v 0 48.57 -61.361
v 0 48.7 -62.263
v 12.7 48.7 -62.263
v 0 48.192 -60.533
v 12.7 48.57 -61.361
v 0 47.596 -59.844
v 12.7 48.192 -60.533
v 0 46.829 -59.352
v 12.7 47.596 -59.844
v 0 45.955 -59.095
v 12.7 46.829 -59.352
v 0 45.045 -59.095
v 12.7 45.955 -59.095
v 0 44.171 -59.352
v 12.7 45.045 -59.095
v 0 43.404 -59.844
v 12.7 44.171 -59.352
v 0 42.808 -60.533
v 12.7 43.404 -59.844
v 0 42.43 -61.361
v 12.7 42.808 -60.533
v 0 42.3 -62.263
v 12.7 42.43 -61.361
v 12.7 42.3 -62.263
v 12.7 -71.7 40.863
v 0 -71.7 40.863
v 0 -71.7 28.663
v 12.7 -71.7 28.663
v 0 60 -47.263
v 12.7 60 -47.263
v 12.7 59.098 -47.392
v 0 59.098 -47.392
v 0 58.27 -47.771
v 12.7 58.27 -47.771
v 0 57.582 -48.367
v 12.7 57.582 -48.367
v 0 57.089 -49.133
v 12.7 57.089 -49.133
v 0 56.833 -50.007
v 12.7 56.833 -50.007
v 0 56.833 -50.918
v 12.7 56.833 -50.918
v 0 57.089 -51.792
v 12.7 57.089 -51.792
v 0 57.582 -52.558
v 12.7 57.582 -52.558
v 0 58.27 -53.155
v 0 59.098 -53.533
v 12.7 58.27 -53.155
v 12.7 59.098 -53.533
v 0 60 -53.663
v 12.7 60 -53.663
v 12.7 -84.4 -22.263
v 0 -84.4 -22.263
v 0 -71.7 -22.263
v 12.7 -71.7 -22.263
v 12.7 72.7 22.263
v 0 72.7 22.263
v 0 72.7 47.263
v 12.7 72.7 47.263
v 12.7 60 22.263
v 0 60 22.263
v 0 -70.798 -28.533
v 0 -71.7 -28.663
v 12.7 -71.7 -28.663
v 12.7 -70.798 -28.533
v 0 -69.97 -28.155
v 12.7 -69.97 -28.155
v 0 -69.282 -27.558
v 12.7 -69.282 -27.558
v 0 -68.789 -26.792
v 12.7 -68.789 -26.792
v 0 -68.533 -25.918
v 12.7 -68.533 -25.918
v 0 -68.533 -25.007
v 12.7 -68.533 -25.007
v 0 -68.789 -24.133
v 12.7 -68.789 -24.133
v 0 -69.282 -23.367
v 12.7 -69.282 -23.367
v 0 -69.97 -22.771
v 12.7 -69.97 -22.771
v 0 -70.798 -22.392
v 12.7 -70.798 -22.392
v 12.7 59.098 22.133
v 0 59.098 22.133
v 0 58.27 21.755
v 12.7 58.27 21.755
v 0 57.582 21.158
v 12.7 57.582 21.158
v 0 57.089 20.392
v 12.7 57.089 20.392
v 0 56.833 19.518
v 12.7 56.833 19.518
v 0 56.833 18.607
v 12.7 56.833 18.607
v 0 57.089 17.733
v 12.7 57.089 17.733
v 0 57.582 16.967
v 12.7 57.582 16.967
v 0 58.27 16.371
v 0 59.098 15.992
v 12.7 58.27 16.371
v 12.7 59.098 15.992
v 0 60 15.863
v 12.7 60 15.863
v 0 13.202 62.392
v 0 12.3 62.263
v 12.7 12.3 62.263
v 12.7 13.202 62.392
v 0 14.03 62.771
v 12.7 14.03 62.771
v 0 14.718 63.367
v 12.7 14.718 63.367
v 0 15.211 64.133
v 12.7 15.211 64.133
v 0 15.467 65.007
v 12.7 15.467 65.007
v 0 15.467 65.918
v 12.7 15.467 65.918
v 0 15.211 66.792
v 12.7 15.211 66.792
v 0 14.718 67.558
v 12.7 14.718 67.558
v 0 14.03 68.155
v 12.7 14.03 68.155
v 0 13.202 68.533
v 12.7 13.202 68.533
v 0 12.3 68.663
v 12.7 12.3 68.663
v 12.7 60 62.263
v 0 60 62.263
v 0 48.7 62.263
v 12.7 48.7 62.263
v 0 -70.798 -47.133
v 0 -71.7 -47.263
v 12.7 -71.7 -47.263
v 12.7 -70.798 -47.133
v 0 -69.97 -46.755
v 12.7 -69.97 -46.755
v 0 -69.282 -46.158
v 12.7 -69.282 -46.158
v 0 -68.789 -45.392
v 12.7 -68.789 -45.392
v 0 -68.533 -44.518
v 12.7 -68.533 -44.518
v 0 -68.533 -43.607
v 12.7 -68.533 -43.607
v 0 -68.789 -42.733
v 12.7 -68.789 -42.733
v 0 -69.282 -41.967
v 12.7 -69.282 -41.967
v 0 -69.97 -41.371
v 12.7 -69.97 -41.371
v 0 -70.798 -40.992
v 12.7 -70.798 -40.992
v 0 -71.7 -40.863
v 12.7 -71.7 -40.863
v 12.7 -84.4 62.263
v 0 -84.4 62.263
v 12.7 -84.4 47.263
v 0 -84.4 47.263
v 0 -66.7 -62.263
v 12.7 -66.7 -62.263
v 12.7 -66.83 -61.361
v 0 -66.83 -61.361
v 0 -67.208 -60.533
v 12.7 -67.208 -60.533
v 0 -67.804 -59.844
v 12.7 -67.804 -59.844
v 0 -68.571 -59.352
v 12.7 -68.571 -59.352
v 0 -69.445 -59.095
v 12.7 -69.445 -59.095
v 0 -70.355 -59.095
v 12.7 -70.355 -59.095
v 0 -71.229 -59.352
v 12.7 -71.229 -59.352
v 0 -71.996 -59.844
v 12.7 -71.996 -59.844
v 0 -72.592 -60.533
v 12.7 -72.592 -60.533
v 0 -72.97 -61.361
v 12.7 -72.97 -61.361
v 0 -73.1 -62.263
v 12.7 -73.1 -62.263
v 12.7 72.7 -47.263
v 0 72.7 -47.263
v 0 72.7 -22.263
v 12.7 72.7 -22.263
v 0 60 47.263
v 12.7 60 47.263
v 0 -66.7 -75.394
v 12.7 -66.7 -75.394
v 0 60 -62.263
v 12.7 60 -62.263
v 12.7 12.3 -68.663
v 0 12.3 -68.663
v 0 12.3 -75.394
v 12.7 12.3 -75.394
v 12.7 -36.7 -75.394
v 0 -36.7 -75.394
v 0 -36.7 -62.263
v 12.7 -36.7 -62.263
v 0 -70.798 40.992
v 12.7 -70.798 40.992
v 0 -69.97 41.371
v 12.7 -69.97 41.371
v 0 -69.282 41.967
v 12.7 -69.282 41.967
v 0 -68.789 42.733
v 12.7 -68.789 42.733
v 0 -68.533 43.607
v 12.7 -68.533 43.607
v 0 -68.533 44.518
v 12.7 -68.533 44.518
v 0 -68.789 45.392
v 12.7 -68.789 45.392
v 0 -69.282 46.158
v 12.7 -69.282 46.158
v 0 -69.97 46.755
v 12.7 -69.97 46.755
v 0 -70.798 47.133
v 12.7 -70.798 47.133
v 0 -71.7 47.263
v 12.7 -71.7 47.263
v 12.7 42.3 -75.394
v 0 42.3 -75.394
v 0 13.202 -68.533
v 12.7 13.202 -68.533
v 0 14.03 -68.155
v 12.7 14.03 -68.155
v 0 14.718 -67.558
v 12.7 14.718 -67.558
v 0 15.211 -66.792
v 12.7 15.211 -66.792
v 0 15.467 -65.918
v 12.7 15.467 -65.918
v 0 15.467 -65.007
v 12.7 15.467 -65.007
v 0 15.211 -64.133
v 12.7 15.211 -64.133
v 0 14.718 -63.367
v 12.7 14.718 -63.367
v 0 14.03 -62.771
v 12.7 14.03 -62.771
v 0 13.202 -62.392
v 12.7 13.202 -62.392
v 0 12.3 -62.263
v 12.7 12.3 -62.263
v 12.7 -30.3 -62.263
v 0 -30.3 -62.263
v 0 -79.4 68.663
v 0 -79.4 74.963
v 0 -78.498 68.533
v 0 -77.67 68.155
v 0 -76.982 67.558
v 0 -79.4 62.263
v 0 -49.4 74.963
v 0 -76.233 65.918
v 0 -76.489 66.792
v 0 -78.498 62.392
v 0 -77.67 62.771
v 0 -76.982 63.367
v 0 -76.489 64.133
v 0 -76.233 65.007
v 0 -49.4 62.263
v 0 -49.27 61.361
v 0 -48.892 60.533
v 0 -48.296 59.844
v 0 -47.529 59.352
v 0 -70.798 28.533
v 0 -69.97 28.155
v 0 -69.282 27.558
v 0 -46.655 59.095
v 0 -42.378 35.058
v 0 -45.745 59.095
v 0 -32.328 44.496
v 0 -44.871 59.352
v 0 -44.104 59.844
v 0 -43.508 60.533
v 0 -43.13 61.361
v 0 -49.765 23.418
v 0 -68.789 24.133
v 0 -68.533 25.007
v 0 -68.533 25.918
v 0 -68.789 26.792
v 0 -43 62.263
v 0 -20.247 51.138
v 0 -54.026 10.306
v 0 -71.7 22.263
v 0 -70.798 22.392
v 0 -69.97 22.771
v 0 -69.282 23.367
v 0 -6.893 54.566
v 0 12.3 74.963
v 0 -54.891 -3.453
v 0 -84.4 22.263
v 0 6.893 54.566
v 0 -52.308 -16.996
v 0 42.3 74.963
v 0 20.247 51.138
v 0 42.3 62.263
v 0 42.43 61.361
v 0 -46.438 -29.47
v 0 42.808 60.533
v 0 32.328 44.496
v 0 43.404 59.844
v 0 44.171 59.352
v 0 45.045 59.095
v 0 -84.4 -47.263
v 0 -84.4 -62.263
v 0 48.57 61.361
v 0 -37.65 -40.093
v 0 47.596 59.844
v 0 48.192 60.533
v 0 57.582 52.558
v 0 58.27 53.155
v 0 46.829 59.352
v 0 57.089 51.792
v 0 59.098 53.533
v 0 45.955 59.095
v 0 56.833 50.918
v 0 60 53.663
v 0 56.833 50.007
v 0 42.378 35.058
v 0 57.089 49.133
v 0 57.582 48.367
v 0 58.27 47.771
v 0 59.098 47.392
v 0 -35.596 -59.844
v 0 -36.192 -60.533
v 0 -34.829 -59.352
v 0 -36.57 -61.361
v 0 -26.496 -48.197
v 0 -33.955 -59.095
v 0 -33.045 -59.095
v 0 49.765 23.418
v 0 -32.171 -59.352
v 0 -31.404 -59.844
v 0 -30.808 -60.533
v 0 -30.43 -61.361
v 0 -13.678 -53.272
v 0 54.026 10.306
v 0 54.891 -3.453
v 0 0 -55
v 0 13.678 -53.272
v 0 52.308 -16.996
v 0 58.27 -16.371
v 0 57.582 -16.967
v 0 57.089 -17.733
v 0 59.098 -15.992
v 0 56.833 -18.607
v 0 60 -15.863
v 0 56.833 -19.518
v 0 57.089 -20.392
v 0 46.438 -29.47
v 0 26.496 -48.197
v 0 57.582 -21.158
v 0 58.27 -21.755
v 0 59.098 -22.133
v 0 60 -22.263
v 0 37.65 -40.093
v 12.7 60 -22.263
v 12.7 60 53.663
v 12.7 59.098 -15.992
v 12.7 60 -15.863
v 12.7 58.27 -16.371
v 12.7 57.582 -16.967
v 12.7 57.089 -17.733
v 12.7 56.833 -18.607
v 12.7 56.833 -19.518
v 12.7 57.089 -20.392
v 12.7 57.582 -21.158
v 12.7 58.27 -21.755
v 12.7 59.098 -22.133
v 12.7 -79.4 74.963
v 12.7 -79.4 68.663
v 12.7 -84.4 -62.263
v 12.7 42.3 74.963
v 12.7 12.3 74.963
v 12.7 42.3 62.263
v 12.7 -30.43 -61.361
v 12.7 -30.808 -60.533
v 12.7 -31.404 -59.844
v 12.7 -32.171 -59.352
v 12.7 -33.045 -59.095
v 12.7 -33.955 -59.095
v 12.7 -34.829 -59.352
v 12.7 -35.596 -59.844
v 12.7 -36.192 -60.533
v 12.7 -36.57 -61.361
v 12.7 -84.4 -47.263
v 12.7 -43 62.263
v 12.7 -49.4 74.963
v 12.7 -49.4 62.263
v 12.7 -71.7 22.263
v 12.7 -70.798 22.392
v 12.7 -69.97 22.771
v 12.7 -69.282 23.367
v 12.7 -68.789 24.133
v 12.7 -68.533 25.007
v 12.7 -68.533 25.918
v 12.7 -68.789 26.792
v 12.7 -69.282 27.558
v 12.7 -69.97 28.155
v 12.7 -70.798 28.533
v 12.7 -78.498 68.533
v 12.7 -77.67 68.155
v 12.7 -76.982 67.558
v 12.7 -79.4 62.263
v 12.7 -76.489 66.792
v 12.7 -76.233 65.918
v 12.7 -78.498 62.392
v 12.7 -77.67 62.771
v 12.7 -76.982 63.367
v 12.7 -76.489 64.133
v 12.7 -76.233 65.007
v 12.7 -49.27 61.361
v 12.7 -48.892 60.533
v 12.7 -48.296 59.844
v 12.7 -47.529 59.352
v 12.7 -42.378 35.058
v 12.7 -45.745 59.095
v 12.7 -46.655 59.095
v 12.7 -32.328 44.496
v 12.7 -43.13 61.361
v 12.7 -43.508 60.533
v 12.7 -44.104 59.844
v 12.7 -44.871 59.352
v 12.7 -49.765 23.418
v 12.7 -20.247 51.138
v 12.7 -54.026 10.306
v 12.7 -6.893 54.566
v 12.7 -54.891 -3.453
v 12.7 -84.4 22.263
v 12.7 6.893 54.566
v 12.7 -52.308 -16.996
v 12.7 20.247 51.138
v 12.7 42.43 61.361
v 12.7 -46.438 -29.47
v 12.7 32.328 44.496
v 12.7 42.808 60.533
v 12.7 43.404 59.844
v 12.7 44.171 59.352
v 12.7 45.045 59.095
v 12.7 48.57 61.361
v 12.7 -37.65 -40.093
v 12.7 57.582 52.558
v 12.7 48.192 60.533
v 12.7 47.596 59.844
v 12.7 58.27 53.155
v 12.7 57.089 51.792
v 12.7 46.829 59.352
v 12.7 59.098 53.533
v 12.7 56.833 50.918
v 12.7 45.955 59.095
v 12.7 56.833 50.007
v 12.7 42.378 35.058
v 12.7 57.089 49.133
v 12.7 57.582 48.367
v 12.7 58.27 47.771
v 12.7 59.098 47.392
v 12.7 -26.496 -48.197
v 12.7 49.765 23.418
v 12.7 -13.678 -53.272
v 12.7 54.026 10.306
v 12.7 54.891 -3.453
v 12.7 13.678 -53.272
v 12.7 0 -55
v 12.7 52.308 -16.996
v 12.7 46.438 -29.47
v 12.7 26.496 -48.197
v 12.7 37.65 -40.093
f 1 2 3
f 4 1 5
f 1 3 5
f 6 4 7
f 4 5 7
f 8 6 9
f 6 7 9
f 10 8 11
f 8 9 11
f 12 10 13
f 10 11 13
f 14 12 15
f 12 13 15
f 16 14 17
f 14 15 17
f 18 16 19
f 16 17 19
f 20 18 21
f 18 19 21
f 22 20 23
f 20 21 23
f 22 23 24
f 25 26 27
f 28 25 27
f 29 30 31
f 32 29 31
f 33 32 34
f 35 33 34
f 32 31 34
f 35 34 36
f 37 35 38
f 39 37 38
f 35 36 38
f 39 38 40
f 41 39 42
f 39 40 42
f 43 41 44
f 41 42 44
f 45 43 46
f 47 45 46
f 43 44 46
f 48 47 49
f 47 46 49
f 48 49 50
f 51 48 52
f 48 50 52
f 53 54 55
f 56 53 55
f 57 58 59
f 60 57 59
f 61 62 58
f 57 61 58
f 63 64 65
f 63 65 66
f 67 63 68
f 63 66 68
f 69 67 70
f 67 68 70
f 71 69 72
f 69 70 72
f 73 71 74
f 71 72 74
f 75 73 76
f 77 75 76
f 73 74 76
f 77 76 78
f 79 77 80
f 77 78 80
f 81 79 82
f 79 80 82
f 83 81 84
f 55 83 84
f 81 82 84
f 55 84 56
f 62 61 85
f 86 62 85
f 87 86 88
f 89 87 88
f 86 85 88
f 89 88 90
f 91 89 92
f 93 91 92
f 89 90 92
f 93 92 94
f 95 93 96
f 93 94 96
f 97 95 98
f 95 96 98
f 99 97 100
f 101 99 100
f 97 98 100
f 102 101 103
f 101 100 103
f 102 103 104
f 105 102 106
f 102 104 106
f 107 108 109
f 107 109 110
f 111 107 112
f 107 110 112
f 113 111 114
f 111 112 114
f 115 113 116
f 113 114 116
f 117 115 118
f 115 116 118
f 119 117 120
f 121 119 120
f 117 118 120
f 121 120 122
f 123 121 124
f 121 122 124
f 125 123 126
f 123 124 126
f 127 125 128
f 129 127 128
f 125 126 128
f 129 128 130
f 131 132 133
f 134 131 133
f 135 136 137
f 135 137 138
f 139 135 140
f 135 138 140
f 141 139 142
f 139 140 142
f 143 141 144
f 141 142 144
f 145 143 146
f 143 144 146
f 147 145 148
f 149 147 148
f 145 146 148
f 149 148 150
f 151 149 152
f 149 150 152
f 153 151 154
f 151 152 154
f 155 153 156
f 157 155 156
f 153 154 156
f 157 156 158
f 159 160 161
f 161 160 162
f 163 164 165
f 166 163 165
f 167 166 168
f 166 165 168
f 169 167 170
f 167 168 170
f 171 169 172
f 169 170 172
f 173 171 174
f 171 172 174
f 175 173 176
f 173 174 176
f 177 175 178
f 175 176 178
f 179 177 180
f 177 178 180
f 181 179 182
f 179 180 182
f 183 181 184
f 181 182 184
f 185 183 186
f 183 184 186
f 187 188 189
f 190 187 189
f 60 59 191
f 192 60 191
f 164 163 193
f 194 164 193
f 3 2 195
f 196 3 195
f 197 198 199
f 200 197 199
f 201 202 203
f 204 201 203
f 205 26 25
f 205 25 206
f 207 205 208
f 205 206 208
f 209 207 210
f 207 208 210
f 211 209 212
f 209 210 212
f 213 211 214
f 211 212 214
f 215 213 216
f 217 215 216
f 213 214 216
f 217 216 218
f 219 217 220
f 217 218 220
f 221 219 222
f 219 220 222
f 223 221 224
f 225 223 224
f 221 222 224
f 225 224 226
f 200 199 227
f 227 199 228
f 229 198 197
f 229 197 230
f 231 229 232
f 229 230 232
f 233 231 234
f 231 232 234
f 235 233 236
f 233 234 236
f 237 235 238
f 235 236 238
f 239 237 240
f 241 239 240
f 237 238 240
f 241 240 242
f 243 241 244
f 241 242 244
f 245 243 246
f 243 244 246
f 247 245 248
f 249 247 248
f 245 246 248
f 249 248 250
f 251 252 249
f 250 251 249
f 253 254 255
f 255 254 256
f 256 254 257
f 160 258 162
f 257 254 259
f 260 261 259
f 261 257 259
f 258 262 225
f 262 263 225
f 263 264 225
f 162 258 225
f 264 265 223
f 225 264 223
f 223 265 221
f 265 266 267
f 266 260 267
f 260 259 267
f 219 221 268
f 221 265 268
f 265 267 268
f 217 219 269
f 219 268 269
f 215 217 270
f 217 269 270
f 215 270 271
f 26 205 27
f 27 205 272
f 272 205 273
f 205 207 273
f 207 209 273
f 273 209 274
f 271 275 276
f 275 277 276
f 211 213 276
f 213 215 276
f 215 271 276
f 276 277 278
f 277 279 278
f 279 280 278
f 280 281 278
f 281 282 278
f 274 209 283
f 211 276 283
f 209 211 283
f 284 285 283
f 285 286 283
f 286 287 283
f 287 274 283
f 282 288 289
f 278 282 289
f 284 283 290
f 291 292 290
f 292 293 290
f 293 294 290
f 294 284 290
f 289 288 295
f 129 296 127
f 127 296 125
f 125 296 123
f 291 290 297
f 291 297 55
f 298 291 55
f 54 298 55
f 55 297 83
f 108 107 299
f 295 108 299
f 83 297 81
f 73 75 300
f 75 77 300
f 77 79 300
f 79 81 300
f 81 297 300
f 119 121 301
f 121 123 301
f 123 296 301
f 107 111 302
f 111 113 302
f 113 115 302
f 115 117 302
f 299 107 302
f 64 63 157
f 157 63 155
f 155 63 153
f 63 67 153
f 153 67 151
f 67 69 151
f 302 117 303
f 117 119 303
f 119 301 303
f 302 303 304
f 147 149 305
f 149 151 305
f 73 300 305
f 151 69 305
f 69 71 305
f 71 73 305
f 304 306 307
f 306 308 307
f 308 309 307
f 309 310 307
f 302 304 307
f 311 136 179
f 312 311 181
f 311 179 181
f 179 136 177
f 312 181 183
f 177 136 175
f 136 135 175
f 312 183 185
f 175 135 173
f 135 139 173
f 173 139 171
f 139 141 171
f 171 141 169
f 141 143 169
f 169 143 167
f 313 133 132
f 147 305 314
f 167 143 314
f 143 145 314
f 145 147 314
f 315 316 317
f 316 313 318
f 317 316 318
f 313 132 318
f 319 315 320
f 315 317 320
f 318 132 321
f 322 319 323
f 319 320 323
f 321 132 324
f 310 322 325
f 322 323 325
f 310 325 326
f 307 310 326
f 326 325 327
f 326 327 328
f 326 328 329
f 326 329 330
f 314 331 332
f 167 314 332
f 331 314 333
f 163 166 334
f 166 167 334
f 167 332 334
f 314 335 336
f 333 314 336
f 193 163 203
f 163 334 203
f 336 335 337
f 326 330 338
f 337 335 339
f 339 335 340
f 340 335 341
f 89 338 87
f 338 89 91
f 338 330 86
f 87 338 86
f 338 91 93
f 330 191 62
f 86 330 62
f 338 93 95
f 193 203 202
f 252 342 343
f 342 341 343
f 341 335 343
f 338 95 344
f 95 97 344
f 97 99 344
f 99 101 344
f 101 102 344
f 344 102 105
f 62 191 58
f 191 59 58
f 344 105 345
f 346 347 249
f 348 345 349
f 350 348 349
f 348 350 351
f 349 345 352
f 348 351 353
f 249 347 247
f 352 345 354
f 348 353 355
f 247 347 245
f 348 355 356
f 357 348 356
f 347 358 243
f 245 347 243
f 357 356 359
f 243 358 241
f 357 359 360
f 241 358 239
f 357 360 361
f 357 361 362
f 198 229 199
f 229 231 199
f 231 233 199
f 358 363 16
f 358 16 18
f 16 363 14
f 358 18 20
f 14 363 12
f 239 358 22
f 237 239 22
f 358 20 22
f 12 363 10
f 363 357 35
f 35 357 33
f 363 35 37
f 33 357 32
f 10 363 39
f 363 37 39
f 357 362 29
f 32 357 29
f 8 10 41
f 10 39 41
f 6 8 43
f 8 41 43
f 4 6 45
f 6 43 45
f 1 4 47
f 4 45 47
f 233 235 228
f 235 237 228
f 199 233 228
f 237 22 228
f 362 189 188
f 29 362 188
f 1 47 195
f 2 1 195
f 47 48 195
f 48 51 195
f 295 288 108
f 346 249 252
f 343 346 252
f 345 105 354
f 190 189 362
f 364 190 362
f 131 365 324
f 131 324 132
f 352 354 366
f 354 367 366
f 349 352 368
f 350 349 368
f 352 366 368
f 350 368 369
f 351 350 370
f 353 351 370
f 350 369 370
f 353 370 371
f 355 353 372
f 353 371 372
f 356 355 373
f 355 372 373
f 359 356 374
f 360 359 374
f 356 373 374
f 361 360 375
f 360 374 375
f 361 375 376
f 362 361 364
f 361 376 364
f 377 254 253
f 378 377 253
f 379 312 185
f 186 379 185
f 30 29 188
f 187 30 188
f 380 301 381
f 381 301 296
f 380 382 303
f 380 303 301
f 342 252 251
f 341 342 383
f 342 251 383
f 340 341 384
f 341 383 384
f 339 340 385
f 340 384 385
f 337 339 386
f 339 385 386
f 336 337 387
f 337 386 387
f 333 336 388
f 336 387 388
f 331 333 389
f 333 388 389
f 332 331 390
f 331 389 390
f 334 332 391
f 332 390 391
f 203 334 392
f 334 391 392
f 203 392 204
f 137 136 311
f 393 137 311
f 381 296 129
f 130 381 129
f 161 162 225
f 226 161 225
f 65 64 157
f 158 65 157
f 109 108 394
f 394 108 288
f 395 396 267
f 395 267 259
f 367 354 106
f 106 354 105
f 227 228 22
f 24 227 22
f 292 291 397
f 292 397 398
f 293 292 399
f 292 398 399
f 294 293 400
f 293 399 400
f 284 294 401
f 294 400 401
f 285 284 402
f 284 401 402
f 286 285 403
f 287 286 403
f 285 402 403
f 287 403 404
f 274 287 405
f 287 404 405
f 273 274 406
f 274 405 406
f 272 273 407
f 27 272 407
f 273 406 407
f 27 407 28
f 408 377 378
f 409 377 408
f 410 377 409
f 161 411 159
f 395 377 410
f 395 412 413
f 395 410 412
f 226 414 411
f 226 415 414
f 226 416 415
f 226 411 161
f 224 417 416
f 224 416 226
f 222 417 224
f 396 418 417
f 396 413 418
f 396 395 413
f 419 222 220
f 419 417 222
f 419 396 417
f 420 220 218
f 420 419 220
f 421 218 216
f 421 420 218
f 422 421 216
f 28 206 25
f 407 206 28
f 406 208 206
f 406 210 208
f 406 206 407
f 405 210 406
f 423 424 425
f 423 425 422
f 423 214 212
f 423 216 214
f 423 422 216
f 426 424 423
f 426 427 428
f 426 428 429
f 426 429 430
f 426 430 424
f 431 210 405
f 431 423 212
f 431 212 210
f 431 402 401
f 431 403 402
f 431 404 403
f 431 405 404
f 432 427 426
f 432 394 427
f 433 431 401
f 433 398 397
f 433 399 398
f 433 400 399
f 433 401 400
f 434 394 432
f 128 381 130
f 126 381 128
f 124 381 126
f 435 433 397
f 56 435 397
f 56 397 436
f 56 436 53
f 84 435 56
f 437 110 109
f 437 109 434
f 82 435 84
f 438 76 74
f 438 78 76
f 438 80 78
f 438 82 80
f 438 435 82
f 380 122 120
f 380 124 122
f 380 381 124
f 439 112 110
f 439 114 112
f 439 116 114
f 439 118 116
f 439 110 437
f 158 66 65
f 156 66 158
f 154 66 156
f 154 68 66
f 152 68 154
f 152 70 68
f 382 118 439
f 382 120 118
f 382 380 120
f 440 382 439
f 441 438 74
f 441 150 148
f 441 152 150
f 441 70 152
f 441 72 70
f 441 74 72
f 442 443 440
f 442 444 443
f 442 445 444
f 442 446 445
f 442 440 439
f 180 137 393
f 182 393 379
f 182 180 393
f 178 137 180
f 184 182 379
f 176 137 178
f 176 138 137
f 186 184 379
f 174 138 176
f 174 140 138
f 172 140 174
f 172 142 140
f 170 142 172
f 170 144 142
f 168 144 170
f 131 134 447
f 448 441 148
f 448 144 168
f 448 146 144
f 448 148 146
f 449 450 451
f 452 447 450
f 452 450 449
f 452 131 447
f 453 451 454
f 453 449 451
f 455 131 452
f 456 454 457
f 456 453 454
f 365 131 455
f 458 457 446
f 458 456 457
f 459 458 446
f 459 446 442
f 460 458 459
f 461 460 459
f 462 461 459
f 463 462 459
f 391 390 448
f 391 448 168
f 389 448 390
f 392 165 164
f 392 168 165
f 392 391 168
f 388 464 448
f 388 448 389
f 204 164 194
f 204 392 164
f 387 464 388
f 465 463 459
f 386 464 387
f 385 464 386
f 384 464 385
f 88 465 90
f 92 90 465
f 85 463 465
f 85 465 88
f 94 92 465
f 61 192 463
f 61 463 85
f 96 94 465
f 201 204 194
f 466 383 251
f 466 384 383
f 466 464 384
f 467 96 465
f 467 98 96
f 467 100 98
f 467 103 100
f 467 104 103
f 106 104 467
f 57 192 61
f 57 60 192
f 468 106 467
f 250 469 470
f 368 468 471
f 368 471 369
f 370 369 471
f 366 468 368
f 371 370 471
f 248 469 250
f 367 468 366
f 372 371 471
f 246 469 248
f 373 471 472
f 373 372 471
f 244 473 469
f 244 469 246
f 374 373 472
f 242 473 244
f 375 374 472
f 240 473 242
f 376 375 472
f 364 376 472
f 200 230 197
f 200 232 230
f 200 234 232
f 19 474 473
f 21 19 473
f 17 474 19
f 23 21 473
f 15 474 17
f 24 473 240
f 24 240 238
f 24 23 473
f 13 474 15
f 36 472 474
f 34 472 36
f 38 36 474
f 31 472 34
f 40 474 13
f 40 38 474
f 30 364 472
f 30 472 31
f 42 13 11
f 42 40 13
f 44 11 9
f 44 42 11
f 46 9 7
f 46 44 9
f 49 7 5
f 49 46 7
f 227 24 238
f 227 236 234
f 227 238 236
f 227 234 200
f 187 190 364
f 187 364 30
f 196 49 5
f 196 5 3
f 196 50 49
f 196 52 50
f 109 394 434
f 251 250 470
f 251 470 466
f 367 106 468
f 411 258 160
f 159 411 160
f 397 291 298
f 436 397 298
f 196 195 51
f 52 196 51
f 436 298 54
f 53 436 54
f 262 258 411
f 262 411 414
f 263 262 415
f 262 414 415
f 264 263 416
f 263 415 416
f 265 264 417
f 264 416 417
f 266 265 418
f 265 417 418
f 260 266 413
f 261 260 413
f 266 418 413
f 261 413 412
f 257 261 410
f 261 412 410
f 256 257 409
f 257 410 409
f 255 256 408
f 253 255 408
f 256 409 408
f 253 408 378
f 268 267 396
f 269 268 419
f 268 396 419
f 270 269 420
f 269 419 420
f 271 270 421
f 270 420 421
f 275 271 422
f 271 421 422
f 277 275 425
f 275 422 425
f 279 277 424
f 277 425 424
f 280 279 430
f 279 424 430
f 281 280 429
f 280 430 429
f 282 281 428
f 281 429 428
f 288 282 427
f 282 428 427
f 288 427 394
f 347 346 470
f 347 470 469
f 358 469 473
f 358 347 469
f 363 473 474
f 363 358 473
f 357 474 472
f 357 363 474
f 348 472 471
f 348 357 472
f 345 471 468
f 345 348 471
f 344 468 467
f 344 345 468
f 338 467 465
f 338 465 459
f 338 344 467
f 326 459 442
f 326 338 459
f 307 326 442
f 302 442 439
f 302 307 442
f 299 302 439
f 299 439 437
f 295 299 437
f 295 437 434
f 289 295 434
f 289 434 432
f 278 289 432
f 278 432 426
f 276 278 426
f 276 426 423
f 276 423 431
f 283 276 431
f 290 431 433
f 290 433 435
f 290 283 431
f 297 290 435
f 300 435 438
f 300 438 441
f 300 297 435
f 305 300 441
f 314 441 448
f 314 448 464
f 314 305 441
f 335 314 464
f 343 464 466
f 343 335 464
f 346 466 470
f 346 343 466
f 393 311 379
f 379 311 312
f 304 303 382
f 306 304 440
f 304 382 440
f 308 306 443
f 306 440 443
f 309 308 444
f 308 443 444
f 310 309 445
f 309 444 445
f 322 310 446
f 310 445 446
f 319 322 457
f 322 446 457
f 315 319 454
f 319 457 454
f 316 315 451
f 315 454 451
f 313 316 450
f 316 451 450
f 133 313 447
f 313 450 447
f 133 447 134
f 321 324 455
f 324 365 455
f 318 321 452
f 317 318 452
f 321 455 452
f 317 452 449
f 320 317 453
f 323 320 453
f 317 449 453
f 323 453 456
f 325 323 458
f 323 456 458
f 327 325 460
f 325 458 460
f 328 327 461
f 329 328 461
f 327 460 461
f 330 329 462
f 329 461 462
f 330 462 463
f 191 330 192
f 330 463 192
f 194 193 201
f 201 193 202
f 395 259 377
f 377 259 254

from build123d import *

# Parameters (mm, degrees)
SKETCH1_R           = 55
BOSS_EXTRUDE1_DEPTH = 12.7
SKETCH2_R           = 3.2
CUT_EXTRUDE1_DEPTH  = 114.880942125


with BuildPart() as part:
    # Sketch1 → Boss-Extrude1 (new body)
    with BuildSketch(Plane(origin=(0, 0, 0), x_dir=(0, 0, -1), z_dir=(1, 0, 0))):
        Polygon((-62.262586226, 60), (-62.262586226, 42.3), (-74.962586226, 42.3), (-74.962586226, 12.3), (-62.262586226, 12.3), (-62.262586226, -49.4), (-74.962586226, -49.4), (-74.962586226, -79.4), (-62.262586226, -79.4), (-62.262586226, -84.4), (-47.262586226, -84.4), (-47.262586226, -71.7), (-22.262586226, -71.7), (-22.262586226, -84.4), (22.262586226, -84.4), (22.262586226, -71.7), (47.262586226, -71.7), (47.262586226, -84.4), (62.262586226, -84.4), (62.262586226, -66.7), (75.393759552, -66.7), (75.393759552, -36.7), (62.262586226, -36.7), (62.262586226, 12.3), (75.393759552, 12.3), (75.393759552, 42.3), (62.262586226, 42.3), (62.262586226, 60), (47.262586226, 60), (47.262586226, 72.7), (22.262586226, 72.7), (22.262586226, 60), (0, 60), (-22.262586226, 60), (-22.262586226, 72.7), (-47.262586226, 72.7), (-47.262586226, 60), align=None)
        Circle(SKETCH1_R, mode=Mode.SUBTRACT)
    extrude(amount=BOSS_EXTRUDE1_DEPTH)

    # Sketch2 → Cut-Extrude1 (cut, through all)
    with BuildSketch(Plane(origin=(12.7, 0, 0), x_dir=(0, 0, -1), z_dir=(1, 0, 0))):
        with Locations((-62.262586226, 45.5)):
            Circle(SKETCH2_R)
        with Locations((-65.462586226, 12.3)):
            Circle(SKETCH2_R)
        with Locations((-62.262586226, -46.2)):
            Circle(SKETCH2_R)
        with Locations((-65.462586226, -79.4)):
            Circle(SKETCH2_R)
        with Locations((62.262586226, -69.9)):
            Circle(SKETCH2_R)
        with Locations((62.262586226, -33.5)):
            Circle(SKETCH2_R)
        with Locations((65.462586226, 12.3)):
            Circle(SKETCH2_R)
        with Locations((62.262586226, 45.5)):
            Circle(SKETCH2_R)
        with Locations((-50.462586226, 60)):
            Circle(SKETCH2_R)
        with Locations((-19.062586226, 60)):
            Circle(SKETCH2_R)
        with Locations((19.062586226, 60)):
            Circle(SKETCH2_R)
        with Locations((50.462586226, 60)):
            Circle(SKETCH2_R)
        with Locations((-44.062586226, -71.7)):
            Circle(SKETCH2_R)
        with Locations((-25.462586226, -71.7)):
            Circle(SKETCH2_R)
        with Locations((25.462586226, -71.7)):
            Circle(SKETCH2_R)
        with Locations((44.062586226, -71.7)):
            Circle(SKETCH2_R)
    extrude(amount=-CUT_EXTRUDE1_DEPTH, mode=Mode.SUBTRACT)


solid = part.part
